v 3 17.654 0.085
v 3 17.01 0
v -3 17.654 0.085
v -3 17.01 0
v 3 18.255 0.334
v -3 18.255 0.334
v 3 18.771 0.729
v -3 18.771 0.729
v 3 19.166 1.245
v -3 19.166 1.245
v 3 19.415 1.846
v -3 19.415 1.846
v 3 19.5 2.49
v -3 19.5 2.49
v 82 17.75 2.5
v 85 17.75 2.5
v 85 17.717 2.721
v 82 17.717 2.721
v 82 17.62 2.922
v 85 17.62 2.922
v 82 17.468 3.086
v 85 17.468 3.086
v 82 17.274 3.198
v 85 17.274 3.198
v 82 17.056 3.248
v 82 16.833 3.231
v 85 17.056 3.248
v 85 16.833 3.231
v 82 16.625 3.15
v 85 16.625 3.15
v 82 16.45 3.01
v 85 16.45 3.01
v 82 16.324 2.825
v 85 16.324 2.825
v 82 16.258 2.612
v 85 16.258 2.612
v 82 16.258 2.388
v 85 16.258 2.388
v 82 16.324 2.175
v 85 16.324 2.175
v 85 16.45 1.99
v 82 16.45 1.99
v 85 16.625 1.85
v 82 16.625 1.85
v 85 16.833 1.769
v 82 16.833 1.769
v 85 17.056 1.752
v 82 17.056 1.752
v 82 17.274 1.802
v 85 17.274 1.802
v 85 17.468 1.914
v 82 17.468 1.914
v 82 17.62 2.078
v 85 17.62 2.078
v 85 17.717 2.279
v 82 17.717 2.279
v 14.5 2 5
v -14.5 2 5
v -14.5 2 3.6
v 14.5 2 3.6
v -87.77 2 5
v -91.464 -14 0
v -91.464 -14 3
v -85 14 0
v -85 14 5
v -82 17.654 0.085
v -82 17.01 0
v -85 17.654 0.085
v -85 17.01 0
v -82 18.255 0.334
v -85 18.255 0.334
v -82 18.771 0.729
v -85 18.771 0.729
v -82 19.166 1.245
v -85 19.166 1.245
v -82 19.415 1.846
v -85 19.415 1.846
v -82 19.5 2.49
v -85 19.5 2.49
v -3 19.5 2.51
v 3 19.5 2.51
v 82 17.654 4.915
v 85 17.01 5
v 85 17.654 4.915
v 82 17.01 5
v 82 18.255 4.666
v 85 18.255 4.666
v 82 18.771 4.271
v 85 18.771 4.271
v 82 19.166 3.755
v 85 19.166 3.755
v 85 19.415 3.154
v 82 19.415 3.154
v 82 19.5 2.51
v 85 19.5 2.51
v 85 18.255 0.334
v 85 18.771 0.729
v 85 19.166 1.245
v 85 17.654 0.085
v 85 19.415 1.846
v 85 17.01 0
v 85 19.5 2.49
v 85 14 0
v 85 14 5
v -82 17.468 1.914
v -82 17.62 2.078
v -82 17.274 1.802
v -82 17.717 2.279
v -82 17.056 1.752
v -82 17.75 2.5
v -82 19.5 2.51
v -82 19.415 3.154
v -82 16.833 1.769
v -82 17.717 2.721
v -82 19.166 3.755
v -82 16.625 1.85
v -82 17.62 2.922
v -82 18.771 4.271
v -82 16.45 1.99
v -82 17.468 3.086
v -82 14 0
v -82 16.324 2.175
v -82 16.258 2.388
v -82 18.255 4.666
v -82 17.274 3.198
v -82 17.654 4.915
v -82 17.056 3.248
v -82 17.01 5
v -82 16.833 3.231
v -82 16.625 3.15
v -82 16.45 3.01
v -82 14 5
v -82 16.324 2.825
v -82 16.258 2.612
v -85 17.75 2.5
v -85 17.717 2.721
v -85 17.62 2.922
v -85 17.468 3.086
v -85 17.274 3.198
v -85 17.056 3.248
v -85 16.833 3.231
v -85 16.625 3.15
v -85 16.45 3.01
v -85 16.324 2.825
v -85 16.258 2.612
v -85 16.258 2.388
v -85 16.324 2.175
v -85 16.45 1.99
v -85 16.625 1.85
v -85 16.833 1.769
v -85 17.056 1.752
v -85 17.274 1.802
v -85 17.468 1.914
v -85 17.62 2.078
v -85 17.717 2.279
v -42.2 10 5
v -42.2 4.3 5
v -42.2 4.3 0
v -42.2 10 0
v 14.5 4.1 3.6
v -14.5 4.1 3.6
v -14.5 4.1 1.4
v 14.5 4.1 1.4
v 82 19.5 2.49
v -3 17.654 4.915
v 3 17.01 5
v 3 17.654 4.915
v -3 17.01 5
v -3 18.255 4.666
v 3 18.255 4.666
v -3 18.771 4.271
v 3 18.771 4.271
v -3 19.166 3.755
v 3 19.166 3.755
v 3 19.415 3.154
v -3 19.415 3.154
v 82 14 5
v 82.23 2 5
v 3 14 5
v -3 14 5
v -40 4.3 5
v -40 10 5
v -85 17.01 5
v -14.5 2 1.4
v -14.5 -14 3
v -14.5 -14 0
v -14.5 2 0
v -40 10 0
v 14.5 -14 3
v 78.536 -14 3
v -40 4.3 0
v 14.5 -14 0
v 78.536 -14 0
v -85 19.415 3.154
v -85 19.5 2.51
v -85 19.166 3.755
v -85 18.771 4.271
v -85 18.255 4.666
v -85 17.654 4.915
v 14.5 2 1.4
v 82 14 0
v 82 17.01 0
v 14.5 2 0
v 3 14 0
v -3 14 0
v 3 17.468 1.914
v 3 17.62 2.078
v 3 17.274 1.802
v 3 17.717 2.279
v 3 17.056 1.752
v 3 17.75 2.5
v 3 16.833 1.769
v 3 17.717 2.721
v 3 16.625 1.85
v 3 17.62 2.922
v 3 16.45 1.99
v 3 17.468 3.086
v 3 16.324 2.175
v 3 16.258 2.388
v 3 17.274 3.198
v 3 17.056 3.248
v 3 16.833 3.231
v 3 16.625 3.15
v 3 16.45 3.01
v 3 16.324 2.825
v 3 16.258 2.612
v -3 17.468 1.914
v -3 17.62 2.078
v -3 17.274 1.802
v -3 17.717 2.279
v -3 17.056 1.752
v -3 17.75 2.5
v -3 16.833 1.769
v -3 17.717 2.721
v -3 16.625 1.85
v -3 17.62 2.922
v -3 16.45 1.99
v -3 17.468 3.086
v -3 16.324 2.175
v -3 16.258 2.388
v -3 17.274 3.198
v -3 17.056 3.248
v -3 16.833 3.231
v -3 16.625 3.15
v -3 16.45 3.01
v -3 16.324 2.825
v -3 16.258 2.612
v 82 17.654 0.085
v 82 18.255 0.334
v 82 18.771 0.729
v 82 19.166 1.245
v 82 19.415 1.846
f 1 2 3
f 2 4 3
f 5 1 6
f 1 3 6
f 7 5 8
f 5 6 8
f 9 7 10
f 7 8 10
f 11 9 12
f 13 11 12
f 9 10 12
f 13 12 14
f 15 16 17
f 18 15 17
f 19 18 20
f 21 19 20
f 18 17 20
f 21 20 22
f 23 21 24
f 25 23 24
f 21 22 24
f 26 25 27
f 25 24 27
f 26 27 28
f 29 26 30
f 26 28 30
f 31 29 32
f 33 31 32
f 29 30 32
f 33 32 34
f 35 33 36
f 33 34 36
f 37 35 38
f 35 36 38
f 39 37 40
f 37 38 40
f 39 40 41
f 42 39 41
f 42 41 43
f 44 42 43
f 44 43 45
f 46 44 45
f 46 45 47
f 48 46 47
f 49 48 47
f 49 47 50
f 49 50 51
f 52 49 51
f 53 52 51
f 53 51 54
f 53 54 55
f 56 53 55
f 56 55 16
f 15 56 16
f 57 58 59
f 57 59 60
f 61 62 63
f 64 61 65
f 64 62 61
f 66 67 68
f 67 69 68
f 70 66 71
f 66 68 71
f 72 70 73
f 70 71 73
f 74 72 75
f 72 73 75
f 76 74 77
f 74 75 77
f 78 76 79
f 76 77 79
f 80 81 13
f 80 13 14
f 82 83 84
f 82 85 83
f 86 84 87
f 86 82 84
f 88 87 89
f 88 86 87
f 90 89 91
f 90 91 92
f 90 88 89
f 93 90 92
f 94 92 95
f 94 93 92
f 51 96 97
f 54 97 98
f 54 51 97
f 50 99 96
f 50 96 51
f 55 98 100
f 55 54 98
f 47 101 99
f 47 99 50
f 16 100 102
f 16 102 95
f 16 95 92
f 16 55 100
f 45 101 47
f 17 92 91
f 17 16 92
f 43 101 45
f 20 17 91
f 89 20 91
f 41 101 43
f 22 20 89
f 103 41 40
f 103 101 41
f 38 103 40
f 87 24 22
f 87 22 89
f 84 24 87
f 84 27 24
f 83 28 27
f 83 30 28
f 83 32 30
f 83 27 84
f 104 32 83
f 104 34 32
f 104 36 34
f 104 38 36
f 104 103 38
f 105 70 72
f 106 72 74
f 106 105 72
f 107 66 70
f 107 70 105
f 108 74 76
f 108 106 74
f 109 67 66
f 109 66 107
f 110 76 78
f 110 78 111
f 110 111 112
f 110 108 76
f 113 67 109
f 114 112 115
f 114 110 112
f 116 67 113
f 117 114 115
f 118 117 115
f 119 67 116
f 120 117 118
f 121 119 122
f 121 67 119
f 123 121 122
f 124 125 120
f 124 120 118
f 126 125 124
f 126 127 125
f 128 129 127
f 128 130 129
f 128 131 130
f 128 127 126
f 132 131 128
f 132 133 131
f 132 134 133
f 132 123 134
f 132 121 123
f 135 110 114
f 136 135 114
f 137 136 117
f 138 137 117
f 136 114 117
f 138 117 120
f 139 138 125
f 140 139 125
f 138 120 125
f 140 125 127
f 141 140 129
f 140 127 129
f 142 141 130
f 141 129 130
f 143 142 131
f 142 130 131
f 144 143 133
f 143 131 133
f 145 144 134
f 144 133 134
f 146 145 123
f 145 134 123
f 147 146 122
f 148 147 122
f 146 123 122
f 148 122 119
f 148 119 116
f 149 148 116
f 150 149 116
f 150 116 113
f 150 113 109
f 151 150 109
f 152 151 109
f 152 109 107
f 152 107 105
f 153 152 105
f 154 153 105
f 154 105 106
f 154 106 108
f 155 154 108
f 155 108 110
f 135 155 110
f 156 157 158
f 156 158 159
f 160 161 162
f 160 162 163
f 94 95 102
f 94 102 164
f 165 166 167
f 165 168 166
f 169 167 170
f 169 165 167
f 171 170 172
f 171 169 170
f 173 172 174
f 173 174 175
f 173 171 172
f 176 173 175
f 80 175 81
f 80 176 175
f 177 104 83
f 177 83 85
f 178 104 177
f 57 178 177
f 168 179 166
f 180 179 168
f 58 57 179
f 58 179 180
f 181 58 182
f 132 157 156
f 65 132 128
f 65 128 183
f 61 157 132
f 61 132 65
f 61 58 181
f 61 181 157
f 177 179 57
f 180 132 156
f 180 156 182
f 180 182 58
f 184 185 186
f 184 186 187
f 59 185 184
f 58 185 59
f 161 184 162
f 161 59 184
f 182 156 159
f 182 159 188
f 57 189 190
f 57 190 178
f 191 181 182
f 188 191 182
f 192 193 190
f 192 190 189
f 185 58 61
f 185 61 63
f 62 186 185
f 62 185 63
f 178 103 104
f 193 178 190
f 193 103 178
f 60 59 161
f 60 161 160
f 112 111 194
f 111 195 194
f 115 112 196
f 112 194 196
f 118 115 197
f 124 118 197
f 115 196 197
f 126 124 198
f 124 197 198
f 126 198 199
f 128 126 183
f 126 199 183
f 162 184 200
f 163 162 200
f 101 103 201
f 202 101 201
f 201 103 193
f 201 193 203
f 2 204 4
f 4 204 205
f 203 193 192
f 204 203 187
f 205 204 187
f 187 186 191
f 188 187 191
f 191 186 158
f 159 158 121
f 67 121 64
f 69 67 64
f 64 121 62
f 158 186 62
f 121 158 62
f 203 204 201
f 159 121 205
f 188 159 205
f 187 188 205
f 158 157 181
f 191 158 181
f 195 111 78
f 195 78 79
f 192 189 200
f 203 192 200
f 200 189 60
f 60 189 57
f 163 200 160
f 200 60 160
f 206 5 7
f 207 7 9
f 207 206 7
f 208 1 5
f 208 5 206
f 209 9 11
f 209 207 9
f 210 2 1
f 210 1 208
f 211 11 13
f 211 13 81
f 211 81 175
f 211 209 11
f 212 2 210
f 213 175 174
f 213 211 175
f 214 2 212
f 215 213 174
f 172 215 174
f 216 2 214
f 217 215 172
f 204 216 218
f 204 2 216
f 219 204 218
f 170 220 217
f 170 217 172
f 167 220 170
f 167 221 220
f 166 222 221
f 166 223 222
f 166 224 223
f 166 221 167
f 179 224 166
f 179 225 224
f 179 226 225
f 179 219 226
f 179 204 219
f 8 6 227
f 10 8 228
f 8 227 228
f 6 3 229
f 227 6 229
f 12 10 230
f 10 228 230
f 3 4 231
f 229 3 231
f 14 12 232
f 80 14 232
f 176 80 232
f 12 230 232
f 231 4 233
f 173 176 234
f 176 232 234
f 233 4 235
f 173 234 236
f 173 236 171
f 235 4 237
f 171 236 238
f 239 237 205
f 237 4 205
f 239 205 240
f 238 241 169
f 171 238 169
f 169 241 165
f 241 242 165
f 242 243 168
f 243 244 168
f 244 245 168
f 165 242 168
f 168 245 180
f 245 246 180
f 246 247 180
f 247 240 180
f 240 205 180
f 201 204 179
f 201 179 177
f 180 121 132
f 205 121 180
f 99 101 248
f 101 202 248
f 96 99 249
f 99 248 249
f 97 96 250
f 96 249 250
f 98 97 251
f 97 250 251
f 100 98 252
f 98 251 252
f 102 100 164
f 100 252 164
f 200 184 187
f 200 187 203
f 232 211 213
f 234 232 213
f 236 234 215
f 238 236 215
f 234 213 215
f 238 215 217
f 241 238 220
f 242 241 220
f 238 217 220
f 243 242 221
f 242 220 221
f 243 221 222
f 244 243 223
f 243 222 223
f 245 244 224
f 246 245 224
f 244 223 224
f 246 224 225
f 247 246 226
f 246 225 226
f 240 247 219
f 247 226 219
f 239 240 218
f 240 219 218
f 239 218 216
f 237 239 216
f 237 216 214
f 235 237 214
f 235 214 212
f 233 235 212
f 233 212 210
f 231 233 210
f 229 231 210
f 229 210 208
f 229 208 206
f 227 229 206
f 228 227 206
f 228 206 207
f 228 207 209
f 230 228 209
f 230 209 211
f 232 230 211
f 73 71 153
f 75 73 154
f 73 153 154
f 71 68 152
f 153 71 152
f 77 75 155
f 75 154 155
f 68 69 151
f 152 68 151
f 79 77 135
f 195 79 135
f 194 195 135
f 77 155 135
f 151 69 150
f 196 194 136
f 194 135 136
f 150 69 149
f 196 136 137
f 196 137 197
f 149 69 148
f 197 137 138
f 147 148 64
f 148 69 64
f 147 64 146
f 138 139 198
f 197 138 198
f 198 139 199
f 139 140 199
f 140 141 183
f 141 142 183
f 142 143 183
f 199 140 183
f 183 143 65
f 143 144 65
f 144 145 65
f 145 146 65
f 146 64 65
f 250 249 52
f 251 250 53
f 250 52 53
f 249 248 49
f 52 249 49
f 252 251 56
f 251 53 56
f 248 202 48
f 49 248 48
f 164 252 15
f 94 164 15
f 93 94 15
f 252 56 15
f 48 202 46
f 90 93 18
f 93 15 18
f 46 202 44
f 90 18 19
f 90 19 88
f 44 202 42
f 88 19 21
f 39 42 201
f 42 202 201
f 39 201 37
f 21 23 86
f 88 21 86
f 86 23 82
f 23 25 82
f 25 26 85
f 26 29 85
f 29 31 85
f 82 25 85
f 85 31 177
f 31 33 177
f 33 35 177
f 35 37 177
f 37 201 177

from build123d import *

# Parameters (mm, degrees)
PAD_DEPTH       = 5
SKETCH001_W     = 29
SKETCH001_H     = 16
POCKET_DEPTH    = 5
SKETCH002_W     = 29
SKETCH002_H     = 2.2
POCKET001_DEPTH = 2.1
POCKET002_DEPTH = 100
POCKET003_DEPTH = 100
SKETCH006_W     = 3
SKETCH006_H     = 5
SKETCH006_W_2   = 6
PAD001_DEPTH    = 5.5
SKETCH008_W     = 2.2
SKETCH008_H     = 5.7
POCKET005_DEPTH = 5
SKETCH009_R     = 0.75
POCKET006_DEPTH = 200
FILLET_R        = 2.49


with BuildPart() as part:
    # Sketch → Pad (new body)
    with BuildSketch(Plane.XY):
        Polygon((-85, 14), (85, 14), (78.535691, -14), (-91.464309, -14), align=None)
    extrude(amount=PAD_DEPTH)

    # Sketch001 (on Face6 of Pad) → Pocket (cut)
    with BuildSketch(Plane.XY.offset(5)):
        with Locations((0, -6)):
            Rectangle(SKETCH001_W, SKETCH001_H)
    extrude(amount=-POCKET_DEPTH, mode=Mode.SUBTRACT)

    # Sketch002 (on Face9 of Pocket) → Pocket001 (cut)
    with BuildSketch(Plane.XZ.offset(-2)):
        with Locations((0, 2.5)):
            Rectangle(SKETCH002_W, SKETCH002_H)
    extrude(amount=-POCKET001_DEPTH, mode=Mode.SUBTRACT)

    # Sketch004 (on Face8 of Pocket001) → Pocket002 (cut)
    with BuildSketch(Plane.YZ.offset(-14.5)):
        Polygon((-14, 5), (2, 5), (-14, 3), align=None)
    extrude(amount=-POCKET002_DEPTH, mode=Mode.SUBTRACT)

    # Sketch005 (on Face11 of Pocket002) → Pocket003 (cut)
    with BuildSketch(Plane(origin=(14.5, 0, 0), x_dir=(0, -1, 0), z_dir=(-1, 0, 0))):
        Polygon((-2, 5), (14, 5), (14, 3), align=None)
    extrude(amount=-POCKET003_DEPTH, mode=Mode.SUBTRACT)

    # Sketch006 (on Face1 of Pocket003) → Pad001 (join)
    with BuildSketch(Plane(origin=(0, 14, 0), x_dir=(-1, 0, 0), z_dir=(0, 1, 0))):
        with Locations((83.5, 2.5)):
            Rectangle(SKETCH006_W, SKETCH006_H)
        with Locations((-83.5, 2.5)):
            Rectangle(SKETCH006_W, SKETCH006_H)
        with Locations((0, 2.5)):
            Rectangle(SKETCH006_W_2, SKETCH006_H)
    extrude(amount=PAD001_DEPTH)

    # Sketch008 (on Face5 of Pocket001) → Pocket005 (cut)
    with BuildSketch(Plane.XY.offset(5)):
        with Locations((-41.1, 7.15)):
            Rectangle(SKETCH008_W, SKETCH008_H)
    extrude(amount=-POCKET005_DEPTH, mode=Mode.SUBTRACT)

    # Sketch009 (on Face35 of Pocket005) → Pocket006 (cut)
    with BuildSketch(Plane.YZ.offset(85)):
        with Locations((17, 2.5)):
            Circle(SKETCH009_R)
    extrude(amount=-POCKET006_DEPTH, mode=Mode.SUBTRACT)

    # Fillet
    fillet_edges = [part.edges().sort_by_distance(p)[0] for p in [
        (83.5, 19.5, 5),
        (83.5, 19.5, 0),
        (0, 19.5, 5),
        (0, 19.5, 0),
        (-83.5, 19.5, 5),
        (-83.5, 19.5, 0),
    ]]
    fillet(fillet_edges, radius=FILLET_R)


solid = part.part
